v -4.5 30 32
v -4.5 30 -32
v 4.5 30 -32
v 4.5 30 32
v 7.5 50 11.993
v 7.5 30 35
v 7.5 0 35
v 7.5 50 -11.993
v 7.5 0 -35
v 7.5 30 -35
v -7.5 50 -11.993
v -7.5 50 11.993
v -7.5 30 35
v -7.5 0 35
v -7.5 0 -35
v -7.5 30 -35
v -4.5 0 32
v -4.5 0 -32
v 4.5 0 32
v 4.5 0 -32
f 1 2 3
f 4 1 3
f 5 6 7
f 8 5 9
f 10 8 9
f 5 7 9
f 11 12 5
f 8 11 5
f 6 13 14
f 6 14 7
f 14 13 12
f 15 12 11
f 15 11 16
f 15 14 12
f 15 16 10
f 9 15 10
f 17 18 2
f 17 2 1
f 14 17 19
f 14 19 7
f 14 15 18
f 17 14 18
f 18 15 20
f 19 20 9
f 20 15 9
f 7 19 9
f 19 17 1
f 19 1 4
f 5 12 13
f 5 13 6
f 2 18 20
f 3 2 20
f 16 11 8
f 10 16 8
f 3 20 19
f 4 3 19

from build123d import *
from OCP.BRepFilletAPI import BRepFilletAPI_MakeChamfer

# Parameters (mm, degrees)
ESQUISSE1_W             = 15
ESQUISSE1_H             = 70
BOSS_EXTRU_1_DEPTH      = 50
CHANFREIN1_SIZE         = 20
CHANFREIN1_SIZE2        = 23.007368144
ESQUISSE2_W             = 9
ESQUISSE2_H             = 64
ENL_V_MAT_EXTRU_1_DEPTH = 30


with BuildPart() as part:
    # Esquisse1 → Boss.-Extru.1 (new body)
    with BuildSketch(Plane(origin=(0, 0, 0), x_dir=(1, 0, 0), z_dir=(0, 1, 0))):
        Rectangle(ESQUISSE1_W, ESQUISSE1_H)
    extrude(amount=BOSS_EXTRU_1_DEPTH)

    # Chanfrein1: one chamfer whose edges measure the first distance from different faces: ONE call of the kernel's chamfer builder (chamfer() names one face for all edges)
    chanfrein1_edges_1 = [part.edges().sort_by_distance(p)[0] for p in [
        (0, 50, -35),
    ]]
    chanfrein1_side_1 = [part.faces().sort_by_distance(p)[0] for p in [
        (0, 25, -35),
    ]]
    chanfrein1_edges_2 = [part.edges().sort_by_distance(p)[0] for p in [
        (0, 50, 35),
    ]]
    chanfrein1_side_2 = [part.faces().sort_by_distance(p)[0] for p in [
        (0, 25, 35),
    ]]
    chanfrein1 = BRepFilletAPI_MakeChamfer(part.part.solid().wrapped)
    for e in chanfrein1_edges_1:
        chanfrein1.Add(CHANFREIN1_SIZE, CHANFREIN1_SIZE2, e.wrapped, chanfrein1_side_1[0].wrapped)  # the first distance lies on this face
    for e in chanfrein1_edges_2:
        chanfrein1.Add(CHANFREIN1_SIZE, CHANFREIN1_SIZE2, e.wrapped, chanfrein1_side_2[0].wrapped)  # the first distance lies on this face
    add(Compound.cast(chanfrein1.Shape()), mode=Mode.REPLACE)

    # Esquisse2 → Enlèv. mat.-Extru.1 (cut)
    with BuildSketch(Plane.XZ):
        Rectangle(ESQUISSE2_W, ESQUISSE2_H)
    extrude(amount=-ENL_V_MAT_EXTRU_1_DEPTH, mode=Mode.SUBTRACT)


solid = part.part
